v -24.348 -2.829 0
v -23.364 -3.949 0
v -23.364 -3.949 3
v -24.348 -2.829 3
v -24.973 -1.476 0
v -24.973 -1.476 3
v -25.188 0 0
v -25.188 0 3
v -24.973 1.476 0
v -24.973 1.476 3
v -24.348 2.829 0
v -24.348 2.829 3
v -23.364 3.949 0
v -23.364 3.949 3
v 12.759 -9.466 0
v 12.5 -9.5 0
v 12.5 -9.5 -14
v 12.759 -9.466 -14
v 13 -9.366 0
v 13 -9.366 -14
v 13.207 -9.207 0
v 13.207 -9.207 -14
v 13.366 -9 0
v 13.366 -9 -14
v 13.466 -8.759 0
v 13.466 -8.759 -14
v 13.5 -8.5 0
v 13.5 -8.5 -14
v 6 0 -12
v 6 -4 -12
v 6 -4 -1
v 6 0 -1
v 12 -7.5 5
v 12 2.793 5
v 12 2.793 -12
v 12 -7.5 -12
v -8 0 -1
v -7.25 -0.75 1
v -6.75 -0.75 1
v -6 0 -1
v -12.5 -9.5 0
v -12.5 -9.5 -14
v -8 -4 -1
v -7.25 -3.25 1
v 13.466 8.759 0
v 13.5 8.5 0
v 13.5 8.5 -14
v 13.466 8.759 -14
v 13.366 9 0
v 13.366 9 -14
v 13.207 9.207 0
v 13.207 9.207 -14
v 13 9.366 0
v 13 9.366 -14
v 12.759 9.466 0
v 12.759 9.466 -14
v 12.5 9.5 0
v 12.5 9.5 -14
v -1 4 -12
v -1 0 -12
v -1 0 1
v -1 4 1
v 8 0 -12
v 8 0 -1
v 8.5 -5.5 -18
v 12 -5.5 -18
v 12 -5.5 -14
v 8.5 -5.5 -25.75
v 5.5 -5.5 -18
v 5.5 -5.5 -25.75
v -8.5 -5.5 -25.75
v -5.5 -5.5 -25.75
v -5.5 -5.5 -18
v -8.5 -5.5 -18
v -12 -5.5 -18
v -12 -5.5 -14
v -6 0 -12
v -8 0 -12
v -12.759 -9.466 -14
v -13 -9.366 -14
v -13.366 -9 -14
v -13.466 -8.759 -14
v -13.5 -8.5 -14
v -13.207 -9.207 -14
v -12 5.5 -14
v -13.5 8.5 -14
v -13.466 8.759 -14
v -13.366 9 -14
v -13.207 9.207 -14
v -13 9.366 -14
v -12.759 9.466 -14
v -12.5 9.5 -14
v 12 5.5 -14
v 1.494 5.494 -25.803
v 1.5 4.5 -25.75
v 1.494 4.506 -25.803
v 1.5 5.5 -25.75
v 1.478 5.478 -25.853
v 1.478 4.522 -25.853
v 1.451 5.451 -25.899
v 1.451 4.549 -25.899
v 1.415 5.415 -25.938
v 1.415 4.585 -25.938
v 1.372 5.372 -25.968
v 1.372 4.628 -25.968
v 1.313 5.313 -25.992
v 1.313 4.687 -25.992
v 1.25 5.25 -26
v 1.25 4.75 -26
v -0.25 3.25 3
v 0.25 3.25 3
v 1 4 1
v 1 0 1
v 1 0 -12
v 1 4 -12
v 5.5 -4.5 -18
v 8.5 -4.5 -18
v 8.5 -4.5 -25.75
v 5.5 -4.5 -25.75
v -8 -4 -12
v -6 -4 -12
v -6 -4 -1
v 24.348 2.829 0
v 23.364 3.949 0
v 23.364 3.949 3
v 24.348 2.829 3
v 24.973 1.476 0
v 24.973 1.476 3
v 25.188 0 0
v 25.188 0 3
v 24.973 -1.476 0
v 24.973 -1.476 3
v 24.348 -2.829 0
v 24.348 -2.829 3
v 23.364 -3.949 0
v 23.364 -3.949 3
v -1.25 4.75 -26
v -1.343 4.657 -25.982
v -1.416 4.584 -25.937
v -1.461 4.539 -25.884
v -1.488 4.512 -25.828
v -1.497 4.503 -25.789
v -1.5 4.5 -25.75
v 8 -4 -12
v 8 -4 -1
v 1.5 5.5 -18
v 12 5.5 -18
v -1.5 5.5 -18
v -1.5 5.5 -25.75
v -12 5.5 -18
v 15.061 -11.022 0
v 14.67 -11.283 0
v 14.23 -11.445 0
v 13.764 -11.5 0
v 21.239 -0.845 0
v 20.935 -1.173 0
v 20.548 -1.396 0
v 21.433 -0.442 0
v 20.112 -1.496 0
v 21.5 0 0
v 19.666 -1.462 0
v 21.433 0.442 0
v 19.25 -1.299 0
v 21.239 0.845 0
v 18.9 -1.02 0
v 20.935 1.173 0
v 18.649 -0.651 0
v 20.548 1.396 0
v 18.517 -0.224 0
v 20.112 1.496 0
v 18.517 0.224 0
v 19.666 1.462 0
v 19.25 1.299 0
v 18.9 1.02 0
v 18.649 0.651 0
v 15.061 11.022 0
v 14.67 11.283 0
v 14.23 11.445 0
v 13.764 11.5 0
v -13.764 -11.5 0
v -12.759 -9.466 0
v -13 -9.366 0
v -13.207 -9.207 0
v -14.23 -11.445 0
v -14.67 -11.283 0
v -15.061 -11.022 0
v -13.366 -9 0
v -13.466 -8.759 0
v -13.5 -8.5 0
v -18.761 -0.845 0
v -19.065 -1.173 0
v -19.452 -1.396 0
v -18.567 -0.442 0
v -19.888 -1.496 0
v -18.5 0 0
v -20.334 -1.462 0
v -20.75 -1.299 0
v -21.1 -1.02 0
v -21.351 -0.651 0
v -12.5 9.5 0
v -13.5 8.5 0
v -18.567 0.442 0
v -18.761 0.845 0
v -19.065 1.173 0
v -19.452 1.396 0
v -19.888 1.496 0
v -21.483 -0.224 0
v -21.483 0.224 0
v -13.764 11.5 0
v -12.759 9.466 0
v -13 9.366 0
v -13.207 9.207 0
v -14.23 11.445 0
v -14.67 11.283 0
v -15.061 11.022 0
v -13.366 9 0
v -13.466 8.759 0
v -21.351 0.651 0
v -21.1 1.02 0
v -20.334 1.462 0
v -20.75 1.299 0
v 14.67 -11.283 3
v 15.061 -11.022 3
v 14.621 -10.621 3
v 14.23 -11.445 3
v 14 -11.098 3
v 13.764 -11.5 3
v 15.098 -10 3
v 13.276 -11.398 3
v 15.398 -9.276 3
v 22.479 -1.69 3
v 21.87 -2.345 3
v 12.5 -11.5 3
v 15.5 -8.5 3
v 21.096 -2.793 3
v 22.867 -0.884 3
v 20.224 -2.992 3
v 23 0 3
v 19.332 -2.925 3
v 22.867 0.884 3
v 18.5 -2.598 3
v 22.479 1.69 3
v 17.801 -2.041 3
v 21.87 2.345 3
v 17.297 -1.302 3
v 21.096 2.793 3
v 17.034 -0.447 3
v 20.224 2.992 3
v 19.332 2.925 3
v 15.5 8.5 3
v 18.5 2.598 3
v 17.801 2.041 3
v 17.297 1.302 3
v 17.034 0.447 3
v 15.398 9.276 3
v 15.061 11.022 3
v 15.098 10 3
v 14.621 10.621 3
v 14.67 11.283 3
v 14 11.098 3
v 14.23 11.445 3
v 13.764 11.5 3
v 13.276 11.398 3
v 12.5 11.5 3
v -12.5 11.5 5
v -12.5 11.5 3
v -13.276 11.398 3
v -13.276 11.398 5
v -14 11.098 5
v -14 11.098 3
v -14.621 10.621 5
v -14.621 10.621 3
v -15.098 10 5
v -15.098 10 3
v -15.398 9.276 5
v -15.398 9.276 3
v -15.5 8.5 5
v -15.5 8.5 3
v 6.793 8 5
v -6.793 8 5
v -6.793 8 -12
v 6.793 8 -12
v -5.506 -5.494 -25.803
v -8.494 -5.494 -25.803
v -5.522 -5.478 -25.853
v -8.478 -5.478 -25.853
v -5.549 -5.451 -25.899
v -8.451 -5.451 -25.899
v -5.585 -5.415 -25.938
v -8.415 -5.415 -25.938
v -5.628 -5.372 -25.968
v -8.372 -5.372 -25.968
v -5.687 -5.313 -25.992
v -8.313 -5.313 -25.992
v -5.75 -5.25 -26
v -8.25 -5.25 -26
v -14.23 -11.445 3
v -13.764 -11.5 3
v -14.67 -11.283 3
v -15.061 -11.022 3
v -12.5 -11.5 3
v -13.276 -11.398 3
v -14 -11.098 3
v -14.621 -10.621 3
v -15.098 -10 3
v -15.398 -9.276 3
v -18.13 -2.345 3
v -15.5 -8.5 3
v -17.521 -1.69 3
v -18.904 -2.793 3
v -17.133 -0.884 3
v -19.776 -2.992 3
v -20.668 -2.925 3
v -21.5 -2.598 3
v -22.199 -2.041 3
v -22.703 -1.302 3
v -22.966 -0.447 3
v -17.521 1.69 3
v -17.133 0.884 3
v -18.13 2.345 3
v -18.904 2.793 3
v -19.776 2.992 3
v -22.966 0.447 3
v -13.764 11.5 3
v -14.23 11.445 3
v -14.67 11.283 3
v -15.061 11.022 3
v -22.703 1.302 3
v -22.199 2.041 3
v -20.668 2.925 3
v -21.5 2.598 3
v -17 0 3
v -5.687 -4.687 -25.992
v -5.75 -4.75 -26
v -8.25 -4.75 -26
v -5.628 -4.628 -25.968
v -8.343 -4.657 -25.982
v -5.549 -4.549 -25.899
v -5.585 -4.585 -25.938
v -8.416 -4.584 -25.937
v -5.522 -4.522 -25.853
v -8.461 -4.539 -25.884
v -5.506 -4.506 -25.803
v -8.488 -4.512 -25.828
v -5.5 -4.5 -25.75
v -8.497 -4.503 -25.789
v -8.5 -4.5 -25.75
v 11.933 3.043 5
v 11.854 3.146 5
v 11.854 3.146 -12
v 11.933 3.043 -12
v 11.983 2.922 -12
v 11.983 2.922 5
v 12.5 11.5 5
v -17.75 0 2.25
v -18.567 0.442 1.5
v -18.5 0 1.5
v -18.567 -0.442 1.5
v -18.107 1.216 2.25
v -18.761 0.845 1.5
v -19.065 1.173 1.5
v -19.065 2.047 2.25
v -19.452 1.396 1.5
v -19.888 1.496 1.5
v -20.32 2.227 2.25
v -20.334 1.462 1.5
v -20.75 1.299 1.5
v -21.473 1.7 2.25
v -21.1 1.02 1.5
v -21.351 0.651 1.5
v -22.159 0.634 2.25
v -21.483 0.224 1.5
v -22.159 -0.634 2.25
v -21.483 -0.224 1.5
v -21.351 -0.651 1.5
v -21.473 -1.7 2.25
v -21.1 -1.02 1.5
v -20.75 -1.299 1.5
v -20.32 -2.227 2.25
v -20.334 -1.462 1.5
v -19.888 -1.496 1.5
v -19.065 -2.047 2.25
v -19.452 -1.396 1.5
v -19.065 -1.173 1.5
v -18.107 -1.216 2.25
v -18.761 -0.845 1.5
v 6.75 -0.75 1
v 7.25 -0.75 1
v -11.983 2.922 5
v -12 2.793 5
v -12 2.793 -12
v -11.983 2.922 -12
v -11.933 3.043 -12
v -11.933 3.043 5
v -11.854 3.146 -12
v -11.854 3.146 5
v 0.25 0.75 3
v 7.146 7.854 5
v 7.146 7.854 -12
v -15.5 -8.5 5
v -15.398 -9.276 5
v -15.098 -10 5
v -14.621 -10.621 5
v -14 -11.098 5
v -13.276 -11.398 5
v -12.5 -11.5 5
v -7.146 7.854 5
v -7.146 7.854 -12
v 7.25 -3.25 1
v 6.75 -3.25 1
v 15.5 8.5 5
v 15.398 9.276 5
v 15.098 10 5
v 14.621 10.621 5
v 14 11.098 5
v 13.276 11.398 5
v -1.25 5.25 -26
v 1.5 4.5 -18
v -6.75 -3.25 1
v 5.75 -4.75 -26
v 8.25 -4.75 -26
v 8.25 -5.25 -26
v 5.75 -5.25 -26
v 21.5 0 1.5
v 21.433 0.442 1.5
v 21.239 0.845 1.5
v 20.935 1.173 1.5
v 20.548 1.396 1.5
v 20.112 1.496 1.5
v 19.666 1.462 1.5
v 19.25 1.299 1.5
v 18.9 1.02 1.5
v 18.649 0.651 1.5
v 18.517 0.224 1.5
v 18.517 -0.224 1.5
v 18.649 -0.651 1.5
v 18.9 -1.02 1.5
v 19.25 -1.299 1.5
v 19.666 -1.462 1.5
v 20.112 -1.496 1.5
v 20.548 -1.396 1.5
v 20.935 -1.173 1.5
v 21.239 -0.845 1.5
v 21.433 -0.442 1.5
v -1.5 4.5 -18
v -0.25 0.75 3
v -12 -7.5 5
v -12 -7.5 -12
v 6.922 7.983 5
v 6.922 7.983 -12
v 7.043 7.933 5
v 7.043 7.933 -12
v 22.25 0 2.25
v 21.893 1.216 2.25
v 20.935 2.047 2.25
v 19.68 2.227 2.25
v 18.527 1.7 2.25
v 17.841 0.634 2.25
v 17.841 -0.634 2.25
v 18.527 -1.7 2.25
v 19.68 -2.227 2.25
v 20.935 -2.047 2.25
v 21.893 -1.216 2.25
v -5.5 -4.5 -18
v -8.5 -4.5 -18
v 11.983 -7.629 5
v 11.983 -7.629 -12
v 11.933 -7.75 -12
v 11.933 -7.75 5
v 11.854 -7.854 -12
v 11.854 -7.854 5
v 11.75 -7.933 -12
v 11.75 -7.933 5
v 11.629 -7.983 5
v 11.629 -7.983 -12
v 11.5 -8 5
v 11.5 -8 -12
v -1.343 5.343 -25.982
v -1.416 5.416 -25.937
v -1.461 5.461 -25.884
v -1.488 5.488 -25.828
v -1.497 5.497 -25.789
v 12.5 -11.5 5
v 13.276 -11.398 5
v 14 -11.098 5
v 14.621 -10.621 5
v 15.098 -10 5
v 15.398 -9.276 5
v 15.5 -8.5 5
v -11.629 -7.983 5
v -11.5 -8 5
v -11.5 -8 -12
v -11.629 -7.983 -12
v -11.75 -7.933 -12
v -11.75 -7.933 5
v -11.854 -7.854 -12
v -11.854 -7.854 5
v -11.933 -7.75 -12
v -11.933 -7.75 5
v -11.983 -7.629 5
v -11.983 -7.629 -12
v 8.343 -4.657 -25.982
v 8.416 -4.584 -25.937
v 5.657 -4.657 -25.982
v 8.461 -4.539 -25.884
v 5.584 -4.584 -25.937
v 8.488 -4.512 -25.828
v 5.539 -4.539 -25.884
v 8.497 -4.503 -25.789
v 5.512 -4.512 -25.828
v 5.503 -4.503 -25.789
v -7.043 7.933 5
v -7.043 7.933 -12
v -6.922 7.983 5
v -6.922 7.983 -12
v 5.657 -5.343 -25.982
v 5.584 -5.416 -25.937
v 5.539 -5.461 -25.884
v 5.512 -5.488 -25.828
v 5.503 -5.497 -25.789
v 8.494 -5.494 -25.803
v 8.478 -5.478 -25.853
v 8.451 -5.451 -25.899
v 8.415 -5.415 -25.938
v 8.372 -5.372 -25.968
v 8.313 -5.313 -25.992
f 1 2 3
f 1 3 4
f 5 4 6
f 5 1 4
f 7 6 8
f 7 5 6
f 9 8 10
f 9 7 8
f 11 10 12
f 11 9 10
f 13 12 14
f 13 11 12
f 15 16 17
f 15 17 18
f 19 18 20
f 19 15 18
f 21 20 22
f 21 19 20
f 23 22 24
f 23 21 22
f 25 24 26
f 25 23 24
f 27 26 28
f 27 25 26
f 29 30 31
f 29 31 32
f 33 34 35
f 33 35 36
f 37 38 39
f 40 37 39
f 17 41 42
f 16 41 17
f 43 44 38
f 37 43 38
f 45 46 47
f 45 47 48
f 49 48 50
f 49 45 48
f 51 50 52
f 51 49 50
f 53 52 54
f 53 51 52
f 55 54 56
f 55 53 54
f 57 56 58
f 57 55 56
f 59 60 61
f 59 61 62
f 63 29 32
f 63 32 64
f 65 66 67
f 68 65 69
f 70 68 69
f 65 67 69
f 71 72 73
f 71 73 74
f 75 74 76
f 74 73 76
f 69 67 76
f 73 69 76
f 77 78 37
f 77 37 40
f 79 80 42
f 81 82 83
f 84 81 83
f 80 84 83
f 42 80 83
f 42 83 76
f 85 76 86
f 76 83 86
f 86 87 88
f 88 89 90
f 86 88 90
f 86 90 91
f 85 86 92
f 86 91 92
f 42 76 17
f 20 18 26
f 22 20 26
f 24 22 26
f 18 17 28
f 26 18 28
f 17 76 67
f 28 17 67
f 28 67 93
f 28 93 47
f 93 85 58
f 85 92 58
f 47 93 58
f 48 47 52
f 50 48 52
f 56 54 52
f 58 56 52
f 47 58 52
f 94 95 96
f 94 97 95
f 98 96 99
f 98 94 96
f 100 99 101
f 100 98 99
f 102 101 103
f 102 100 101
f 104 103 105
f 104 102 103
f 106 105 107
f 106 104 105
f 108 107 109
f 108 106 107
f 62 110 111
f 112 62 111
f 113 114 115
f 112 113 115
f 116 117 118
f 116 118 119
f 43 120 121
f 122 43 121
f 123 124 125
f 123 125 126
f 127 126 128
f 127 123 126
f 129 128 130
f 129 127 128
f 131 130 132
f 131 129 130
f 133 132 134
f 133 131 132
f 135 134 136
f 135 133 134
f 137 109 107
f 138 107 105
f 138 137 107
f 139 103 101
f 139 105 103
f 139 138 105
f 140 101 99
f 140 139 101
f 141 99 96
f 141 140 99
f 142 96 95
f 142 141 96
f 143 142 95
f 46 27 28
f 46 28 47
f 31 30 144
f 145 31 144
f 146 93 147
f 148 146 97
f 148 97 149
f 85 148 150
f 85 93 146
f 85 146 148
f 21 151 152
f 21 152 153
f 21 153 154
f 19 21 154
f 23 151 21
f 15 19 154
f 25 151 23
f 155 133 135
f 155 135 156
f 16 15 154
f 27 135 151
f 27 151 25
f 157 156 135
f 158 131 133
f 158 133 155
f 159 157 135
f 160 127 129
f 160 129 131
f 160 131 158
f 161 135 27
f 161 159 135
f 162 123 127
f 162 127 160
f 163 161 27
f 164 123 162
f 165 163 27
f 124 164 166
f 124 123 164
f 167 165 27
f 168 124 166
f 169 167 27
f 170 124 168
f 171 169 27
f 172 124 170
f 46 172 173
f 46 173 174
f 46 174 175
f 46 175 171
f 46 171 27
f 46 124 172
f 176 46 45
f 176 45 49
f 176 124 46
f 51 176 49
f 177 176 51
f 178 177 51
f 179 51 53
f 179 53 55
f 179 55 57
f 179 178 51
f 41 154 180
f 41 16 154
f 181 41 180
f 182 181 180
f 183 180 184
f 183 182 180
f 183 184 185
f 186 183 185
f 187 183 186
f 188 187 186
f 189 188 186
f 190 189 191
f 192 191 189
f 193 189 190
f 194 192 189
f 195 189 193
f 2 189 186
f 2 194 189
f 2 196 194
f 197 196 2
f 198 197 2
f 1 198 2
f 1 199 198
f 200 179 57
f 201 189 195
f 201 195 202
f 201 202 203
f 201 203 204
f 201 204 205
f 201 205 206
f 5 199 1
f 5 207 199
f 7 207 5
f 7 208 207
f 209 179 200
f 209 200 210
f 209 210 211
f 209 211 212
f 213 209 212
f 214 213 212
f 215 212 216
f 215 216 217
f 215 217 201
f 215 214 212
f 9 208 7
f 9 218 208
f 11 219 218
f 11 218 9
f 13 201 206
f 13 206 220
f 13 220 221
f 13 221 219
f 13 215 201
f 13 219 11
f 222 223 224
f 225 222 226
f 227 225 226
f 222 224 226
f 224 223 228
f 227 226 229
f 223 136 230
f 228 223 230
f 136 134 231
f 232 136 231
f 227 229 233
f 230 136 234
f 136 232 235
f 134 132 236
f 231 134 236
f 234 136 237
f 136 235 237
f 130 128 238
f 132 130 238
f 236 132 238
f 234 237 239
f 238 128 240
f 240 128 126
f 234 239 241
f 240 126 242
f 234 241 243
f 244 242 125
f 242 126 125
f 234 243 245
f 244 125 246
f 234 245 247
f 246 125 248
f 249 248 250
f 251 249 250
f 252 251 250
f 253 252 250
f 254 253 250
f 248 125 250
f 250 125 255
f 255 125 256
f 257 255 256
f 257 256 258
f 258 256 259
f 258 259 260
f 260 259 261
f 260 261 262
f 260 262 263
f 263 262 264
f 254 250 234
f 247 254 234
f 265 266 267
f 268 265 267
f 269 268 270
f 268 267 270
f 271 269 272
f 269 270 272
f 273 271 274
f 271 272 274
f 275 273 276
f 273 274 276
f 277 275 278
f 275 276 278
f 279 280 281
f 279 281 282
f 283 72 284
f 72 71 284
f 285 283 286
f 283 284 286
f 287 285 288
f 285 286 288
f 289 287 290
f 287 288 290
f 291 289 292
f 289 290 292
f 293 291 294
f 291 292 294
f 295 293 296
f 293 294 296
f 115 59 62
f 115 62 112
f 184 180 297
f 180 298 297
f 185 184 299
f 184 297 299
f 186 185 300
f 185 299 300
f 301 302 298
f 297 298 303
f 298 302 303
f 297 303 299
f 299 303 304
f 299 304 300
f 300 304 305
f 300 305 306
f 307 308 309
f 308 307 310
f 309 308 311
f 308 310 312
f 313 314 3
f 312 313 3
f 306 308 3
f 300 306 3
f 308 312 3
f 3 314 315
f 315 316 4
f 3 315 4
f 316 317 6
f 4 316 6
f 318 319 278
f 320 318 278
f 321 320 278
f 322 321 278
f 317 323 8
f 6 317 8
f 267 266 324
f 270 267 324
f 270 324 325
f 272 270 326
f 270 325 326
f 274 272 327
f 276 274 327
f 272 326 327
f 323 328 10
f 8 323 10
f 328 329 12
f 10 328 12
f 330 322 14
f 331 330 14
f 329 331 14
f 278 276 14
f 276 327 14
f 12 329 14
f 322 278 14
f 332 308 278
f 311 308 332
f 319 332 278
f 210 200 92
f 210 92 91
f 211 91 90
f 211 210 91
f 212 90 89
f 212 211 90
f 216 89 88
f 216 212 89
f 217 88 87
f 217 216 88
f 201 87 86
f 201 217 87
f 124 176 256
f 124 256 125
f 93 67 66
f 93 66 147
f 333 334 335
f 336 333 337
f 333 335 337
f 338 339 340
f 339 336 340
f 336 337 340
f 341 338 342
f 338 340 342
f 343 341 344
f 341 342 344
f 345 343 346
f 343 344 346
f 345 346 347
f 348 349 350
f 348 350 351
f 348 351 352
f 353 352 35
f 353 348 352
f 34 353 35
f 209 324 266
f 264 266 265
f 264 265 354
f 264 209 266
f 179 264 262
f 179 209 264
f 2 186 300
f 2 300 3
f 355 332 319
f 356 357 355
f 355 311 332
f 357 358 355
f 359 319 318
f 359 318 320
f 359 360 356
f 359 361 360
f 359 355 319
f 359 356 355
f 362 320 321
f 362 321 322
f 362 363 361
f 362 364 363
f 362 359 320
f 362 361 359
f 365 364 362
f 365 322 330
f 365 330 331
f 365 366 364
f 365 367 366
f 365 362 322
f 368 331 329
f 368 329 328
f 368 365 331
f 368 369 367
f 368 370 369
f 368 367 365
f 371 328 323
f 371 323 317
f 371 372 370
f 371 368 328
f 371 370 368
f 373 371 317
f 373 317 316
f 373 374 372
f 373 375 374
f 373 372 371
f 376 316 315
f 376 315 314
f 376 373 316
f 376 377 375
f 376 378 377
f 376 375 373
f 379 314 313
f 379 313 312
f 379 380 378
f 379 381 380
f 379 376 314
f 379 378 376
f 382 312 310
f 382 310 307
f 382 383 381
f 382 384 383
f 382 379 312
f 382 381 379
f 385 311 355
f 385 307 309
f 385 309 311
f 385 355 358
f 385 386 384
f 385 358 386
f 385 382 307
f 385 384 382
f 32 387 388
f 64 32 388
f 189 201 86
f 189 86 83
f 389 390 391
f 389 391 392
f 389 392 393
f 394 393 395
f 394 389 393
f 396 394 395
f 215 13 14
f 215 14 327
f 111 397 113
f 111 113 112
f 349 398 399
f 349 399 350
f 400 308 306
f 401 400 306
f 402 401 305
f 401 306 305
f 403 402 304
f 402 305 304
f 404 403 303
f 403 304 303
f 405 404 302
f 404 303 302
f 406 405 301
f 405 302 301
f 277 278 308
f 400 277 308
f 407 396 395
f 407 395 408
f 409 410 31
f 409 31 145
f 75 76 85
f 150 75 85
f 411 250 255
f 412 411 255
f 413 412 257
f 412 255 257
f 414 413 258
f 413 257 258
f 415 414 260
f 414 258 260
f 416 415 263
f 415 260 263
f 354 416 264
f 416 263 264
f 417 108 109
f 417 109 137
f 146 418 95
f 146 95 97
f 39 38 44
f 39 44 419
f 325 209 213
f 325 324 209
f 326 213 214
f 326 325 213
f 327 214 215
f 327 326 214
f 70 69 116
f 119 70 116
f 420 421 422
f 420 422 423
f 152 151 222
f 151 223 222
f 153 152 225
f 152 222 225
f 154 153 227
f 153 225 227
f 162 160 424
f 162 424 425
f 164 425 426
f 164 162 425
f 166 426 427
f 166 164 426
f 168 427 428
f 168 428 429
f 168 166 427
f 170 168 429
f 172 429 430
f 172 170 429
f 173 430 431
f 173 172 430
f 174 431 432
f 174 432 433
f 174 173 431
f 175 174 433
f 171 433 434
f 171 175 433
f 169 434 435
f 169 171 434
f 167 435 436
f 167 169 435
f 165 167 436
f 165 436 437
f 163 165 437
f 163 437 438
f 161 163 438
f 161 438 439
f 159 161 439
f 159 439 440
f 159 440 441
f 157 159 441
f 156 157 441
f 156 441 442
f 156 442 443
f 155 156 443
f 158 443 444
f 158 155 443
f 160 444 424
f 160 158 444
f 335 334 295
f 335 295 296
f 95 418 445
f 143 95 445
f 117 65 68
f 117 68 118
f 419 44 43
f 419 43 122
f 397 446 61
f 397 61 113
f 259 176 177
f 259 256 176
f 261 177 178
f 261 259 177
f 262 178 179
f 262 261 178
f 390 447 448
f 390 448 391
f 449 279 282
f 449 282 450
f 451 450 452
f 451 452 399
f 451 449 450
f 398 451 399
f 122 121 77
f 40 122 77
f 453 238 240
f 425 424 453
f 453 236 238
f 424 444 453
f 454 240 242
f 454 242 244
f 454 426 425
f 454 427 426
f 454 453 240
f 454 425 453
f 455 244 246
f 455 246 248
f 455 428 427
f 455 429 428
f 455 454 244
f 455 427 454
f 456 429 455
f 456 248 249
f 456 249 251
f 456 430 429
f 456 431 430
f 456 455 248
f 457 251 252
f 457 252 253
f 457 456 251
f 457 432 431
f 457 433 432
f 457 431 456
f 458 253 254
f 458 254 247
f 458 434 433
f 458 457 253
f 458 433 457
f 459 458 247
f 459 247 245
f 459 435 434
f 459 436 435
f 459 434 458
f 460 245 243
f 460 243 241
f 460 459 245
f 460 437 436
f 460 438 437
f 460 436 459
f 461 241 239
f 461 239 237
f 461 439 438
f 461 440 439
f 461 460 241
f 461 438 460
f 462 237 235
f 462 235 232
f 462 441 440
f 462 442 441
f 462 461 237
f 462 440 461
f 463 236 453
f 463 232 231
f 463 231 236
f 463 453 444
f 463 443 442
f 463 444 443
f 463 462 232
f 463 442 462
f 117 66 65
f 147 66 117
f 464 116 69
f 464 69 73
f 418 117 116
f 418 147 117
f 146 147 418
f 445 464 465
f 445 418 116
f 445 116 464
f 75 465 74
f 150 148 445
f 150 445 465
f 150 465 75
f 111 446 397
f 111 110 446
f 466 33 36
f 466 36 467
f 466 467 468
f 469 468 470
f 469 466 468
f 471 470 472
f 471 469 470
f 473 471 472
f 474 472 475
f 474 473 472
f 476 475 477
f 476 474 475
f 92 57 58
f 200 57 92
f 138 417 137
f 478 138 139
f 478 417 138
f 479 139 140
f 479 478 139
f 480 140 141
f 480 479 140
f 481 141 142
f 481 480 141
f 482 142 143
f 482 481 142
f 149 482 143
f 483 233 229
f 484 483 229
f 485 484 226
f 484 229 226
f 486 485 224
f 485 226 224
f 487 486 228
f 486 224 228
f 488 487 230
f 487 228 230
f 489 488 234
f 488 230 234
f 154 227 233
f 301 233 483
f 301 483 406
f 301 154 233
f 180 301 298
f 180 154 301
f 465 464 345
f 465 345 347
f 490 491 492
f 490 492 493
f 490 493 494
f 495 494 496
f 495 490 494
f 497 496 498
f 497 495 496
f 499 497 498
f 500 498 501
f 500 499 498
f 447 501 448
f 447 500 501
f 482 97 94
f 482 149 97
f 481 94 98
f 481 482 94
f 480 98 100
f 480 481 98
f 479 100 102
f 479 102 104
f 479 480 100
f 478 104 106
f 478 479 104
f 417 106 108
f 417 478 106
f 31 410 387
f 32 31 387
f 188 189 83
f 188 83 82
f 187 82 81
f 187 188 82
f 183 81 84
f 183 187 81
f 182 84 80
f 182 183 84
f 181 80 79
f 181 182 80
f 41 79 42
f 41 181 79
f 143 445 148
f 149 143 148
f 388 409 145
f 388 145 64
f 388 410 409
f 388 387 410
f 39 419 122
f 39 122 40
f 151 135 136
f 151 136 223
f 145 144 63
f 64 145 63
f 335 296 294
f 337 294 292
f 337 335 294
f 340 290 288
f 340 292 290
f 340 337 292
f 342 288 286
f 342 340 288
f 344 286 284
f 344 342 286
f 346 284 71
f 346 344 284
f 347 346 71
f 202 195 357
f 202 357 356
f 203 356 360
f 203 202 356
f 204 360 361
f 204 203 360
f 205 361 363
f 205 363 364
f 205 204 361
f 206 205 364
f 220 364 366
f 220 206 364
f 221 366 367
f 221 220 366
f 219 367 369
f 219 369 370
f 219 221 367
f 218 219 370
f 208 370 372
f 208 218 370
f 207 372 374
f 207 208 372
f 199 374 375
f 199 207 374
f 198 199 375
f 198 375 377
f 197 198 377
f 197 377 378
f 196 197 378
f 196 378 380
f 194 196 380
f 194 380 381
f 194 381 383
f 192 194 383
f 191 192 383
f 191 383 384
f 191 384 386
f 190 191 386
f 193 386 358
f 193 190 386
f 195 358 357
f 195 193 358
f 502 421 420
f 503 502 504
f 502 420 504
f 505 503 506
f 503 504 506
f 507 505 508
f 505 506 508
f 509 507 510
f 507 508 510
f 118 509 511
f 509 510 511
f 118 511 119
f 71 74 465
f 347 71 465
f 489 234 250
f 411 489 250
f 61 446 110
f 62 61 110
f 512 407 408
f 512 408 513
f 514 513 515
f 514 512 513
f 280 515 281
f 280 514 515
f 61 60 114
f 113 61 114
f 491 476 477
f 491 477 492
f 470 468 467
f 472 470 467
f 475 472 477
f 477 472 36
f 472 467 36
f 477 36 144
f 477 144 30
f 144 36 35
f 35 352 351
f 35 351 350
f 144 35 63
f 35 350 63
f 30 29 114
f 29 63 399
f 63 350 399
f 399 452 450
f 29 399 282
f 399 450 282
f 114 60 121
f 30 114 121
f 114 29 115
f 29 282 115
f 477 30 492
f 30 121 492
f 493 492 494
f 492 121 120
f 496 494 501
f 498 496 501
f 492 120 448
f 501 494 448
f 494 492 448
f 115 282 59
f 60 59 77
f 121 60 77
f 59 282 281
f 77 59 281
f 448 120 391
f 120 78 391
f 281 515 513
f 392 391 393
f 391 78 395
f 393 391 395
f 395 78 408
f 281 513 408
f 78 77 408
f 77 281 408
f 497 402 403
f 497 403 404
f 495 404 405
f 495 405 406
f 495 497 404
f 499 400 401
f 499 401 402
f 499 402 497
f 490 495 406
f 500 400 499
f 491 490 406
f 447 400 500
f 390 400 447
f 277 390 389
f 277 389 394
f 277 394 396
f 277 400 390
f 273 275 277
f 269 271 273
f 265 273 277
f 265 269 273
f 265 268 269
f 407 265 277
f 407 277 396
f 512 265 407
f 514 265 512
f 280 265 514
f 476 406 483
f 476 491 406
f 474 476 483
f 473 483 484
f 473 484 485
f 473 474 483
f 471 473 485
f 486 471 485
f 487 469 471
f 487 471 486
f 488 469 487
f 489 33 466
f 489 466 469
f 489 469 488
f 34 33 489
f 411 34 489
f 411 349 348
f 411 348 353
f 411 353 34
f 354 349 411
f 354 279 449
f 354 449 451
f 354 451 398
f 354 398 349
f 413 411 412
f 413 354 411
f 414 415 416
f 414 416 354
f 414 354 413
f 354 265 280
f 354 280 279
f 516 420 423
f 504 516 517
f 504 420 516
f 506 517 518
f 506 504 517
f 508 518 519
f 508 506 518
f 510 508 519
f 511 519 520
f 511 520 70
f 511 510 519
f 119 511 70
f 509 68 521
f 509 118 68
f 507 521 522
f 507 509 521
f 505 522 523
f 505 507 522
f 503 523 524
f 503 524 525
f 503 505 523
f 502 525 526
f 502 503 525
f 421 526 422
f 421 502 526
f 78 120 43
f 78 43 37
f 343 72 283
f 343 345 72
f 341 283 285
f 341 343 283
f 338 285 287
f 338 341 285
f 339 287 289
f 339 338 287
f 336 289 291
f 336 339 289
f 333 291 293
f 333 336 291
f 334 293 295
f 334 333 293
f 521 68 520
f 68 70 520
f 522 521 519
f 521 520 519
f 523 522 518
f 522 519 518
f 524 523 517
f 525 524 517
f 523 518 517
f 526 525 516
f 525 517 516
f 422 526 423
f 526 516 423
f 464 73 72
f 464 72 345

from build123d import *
from OCP.BRepFilletAPI import BRepFilletAPI_MakeChamfer

# Parameters (mm, degrees)
SKIZZE1_R                       = 1.5
AUFSATZ_LINEAR_AUSTRAGEN1_DEPTH = 3
VERRUNDUNG1_R                   = 2
FASE1_SIZE                      = 1.5
AUFSATZ_LINEAR_AUSTRAGEN2_DEPTH = 2
AUFSATZ_LINEAR_AUSTRAGEN3_DEPTH = 14
SCHNITT_LINEAR_AUSTRAGEN1_DEPTH = 17
SKIZZE5_W                       = 24
SKIZZE5_H                       = 11
AUFSATZ_LINEAR_AUSTRAGEN4_DEPTH = 4
SKIZZE6_W                       = 3
SKIZZE6_H                       = 1
AUFSATZ_LINEAR_AUSTRAGEN5_DEPTH = 8
SKIZZE7_W                       = 2
SKIZZE7_H                       = 4
AUFSATZ_LINEAR_AUSTRAGEN6_DEPTH = 13
SKIZZE8_W                       = 2
SKIZZE8_H                       = 4
AUFSATZ_LINEAR_AUSTRAGEN7_DEPTH = 15
FASE2_SIZE                      = 2
FASE2_SIZE2                     = 0.75
VERRUNDUNG2_R                   = 0.25


with BuildPart() as part:
    # Skizze1 → Aufsatz-Linear austragen1 (new body)
    with BuildSketch(Plane.XY):
        with BuildLine():
            ThreePointArc((23.364069952, 3.949125596), (25.187731645, 0), (23.364069952, -3.949125596))
            Line((23.364069952, -3.949125596), (14.5, -11.5))
            Line((14.5, -11.5), (-14.5, -11.5))
            Line((-14.5, -11.5), (-23.364069952, -3.949125596))
            ThreePointArc((-23.364069952, -3.949125596), (-25.187731645, 0), (-23.364069952, 3.949125596))
            Line((-23.364069952, 3.949125596), (-14.5, 11.5))
            Line((-14.5, 11.5), (14.5, 11.5))
            Line((14.5, 11.5), (23.364069952, 3.949125596))
        make_face()
        with Locations((20, 0)):
            Circle(SKIZZE1_R, mode=Mode.SUBTRACT)
        with Locations((-20, 0)):
            Circle(SKIZZE1_R, mode=Mode.SUBTRACT)
    extrude(amount=AUFSATZ_LINEAR_AUSTRAGEN1_DEPTH)

    # Verrundung1
    verrundung1_edges = [part.edges().sort_by_distance(p)[0] for p in [
        (14.5, -11.5, 1.5),
        (-14.5, -11.5, 1.5),
        (-14.5, 11.5, 1.5),
        (14.5, 11.5, 1.5),
    ]]
    fillet(verrundung1_edges, radius=VERRUNDUNG1_R)

    # Fase1
    fase1_edges = [part.edges().sort_by_distance(p)[0] for p in [
        (18.5, 0, 3),
        (-21.5, 0, 3),
    ]]
    chamfer(fase1_edges, length=FASE1_SIZE)

    # Skizze2 → Aufsatz-Linear austragen2 (add)
    with BuildSketch(Plane.XY.offset(3)):
        with BuildLine():
            Line((-12.5, -11.5), (12.5, -11.5))
            ThreePointArc((12.5, -11.5), (14.621320344, -10.621320344), (15.5, -8.5))
            Line((15.5, -8.5), (15.5, 8.5))
            ThreePointArc((15.5, 8.5), (14.621320344, 10.621320344), (12.5, 11.5))
            Line((12.5, 11.5), (-12.5, 11.5))
            ThreePointArc((-12.5, 11.5), (-14.621320344, 10.621320344), (-15.5, 8.5))
            Line((-15.5, 8.5), (-15.5, -8.5))
            ThreePointArc((-15.5, -8.5), (-14.621320344, -10.621320344), (-12.5, -11.5))
        make_face()
    extrude(amount=AUFSATZ_LINEAR_AUSTRAGEN2_DEPTH)

    # Skizze4 → Aufsatz-Linear austragen3 (add)
    with BuildSketch(Plane(origin=(0, 0, 0), x_dir=(-1, 0, 0), z_dir=(0, 0, -1))):
        with BuildLine():
            Line((12.5, -9.5), (-12.5, -9.5))
            ThreePointArc((-12.5, -9.5), (-13.207106781, -9.207106781), (-13.5, -8.5))
            Line((-13.5, -8.5), (-13.5, 8.5))
            ThreePointArc((-13.5, 8.5), (-13.207106781, 9.207106781), (-12.5, 9.5))
            Line((-12.5, 9.5), (12.5, 9.5))
            ThreePointArc((12.5, 9.5), (13.207106781, 9.207106781), (13.5, 8.5))
            Line((13.5, 8.5), (13.5, -8.5))
            ThreePointArc((13.5, -8.5), (13.207106781, -9.207106781), (12.5, -9.5))
        make_face()
    extrude(amount=AUFSATZ_LINEAR_AUSTRAGEN3_DEPTH)

    # Skizze3 → Schnitt-Linear austragen1 (cut)
    with BuildSketch(Plane.XY.offset(5)):
        with BuildLine():
            Line((11.5, -8), (-11.5, -8))
            ThreePointArc((-11.5, -8), (-11.853553391, -7.853553391), (-12, -7.5))
            Line((-12, -7.5), (-12, 2.792893219))
            ThreePointArc((-12, 2.792893219), (-11.961939766, 2.984234935), (-11.853553391, 3.146446609))
            Line((-11.853553391, 3.146446609), (-7.146446609, 7.853553391))
            ThreePointArc((-7.146446609, 7.853553391), (-6.984234935, 7.961939766), (-6.792893219, 8))
            Line((-6.792893219, 8), (6.792893219, 8))
            ThreePointArc((6.792893219, 8), (6.984234935, 7.961939766), (7.146446609, 7.853553391))
            Line((7.146446609, 7.853553391), (11.853553391, 3.146446609))
            ThreePointArc((11.853553391, 3.146446609), (11.961939766, 2.984234935), (12, 2.792893219))
            Line((12, 2.792893219), (12, -7.5))
            ThreePointArc((12, -7.5), (11.853553391, -7.853553391), (11.5, -8))
        make_face()
    extrude(amount=-SCHNITT_LINEAR_AUSTRAGEN1_DEPTH, mode=Mode.SUBTRACT)

    # Skizze5 → Aufsatz-Linear austragen4 (add)
    with BuildSketch(Plane(origin=(0, 0, -14), x_dir=(-1, 0, 0), z_dir=(0, 0, -1))):
        Rectangle(SKIZZE5_W, SKIZZE5_H)
    extrude(amount=AUFSATZ_LINEAR_AUSTRAGEN4_DEPTH)

    # Skizze6 → Aufsatz-Linear austragen5 (add)
    with BuildSketch(Plane(origin=(0, 0, -18), x_dir=(-1, 0, 0), z_dir=(0, 0, -1))):
        with Locations((0, 5)):
            Rectangle(SKIZZE6_W, SKIZZE6_H)
        with Locations((-7, -5)):
            Rectangle(SKIZZE6_W, SKIZZE6_H)
        with Locations((7, -5)):
            Rectangle(SKIZZE6_W, SKIZZE6_H)
    extrude(amount=AUFSATZ_LINEAR_AUSTRAGEN5_DEPTH)

    # Skizze7 → Aufsatz-Linear austragen6 (add)
    with BuildSketch(Plane.XY.offset(-12)):
        with Locations((-7, -2)):
            Rectangle(SKIZZE7_W, SKIZZE7_H)
        with Locations((7, -2)):
            Rectangle(SKIZZE7_W, SKIZZE7_H)
    extrude(amount=AUFSATZ_LINEAR_AUSTRAGEN6_DEPTH)

    # Skizze8 → Aufsatz-Linear austragen7 (add)
    with BuildSketch(Plane.XY.offset(-12)):
        with Locations((0, 2)):
            Rectangle(SKIZZE8_W, SKIZZE8_H)
    extrude(amount=AUFSATZ_LINEAR_AUSTRAGEN7_DEPTH)

    # Fase2: one chamfer whose edges measure the first distance from different faces: ONE call of the kernel's chamfer builder (chamfer() names one face for all edges)
    fase2_edges_1 = [part.edges().sort_by_distance(p)[0] for p in [
        (7, -4, 1),
    ]]
    fase2_side_1 = [part.faces().sort_by_distance(p)[0] for p in [
        (7, -4, -5.5),
    ]]
    fase2_edges_2 = [part.edges().sort_by_distance(p)[0] for p in [
        (6, -2, 1),
    ]]
    fase2_side_2 = [part.faces().sort_by_distance(p)[0] for p in [
        (6, -2, -5.5),
    ]]
    fase2_edges_3 = [part.edges().sort_by_distance(p)[0] for p in [
        (7, 0, 1),
    ]]
    fase2_side_3 = [part.faces().sort_by_distance(p)[0] for p in [
        (7, 0, -5.5),
    ]]
    fase2_edges_4 = [part.edges().sort_by_distance(p)[0] for p in [
        (8, -2, 1),
    ]]
    fase2_side_4 = [part.faces().sort_by_distance(p)[0] for p in [
        (8, -2, -5.5),
    ]]
    fase2_edges_5 = [part.edges().sort_by_distance(p)[0] for p in [
        (0, 0, 3),
    ]]
    fase2_side_5 = [part.faces().sort_by_distance(p)[0] for p in [
        (0, 0, -4.5),
    ]]
    fase2_edges_6 = [part.edges().sort_by_distance(p)[0] for p in [
        (-1, 2, 3),
    ]]
    fase2_side_6 = [part.faces().sort_by_distance(p)[0] for p in [
        (-1, 2, -4.5),
    ]]
    fase2_edges_7 = [part.edges().sort_by_distance(p)[0] for p in [
        (0, 4, 3),
    ]]
    fase2_side_7 = [part.faces().sort_by_distance(p)[0] for p in [
        (0, 4, -4.5),
    ]]
    fase2_edges_8 = [part.edges().sort_by_distance(p)[0] for p in [
        (1, 2, 3),
    ]]
    fase2_side_8 = [part.faces().sort_by_distance(p)[0] for p in [
        (1, 2, -4.5),
    ]]
    fase2_edges_9 = [part.edges().sort_by_distance(p)[0] for p in [
        (-7, 0, 1),
    ]]
    fase2_side_9 = [part.faces().sort_by_distance(p)[0] for p in [
        (-7, 0, -5.5),
    ]]
    fase2_edges_10 = [part.edges().sort_by_distance(p)[0] for p in [
        (-6, -2, 1),
    ]]
    fase2_side_10 = [part.faces().sort_by_distance(p)[0] for p in [
        (-6, -2, -5.5),
    ]]
    fase2_edges_11 = [part.edges().sort_by_distance(p)[0] for p in [
        (-7, -4, 1),
    ]]
    fase2_side_11 = [part.faces().sort_by_distance(p)[0] for p in [
        (-7, -4, -5.5),
    ]]
    fase2_edges_12 = [part.edges().sort_by_distance(p)[0] for p in [
        (-8, -2, 1),
    ]]
    fase2_side_12 = [part.faces().sort_by_distance(p)[0] for p in [
        (-8, -2, -5.5),
    ]]
    fase2 = BRepFilletAPI_MakeChamfer(part.part.solid().wrapped)
    for e in fase2_edges_1:
        fase2.Add(FASE2_SIZE, FASE2_SIZE2, e.wrapped, fase2_side_1[0].wrapped)  # the first distance lies on this face
    for e in fase2_edges_2:
        fase2.Add(FASE2_SIZE, FASE2_SIZE2, e.wrapped, fase2_side_2[0].wrapped)  # the first distance lies on this face
    for e in fase2_edges_3:
        fase2.Add(FASE2_SIZE, FASE2_SIZE2, e.wrapped, fase2_side_3[0].wrapped)  # the first distance lies on this face
    for e in fase2_edges_4:
        fase2.Add(FASE2_SIZE, FASE2_SIZE2, e.wrapped, fase2_side_4[0].wrapped)  # the first distance lies on this face
    for e in fase2_edges_5:
        fase2.Add(FASE2_SIZE, FASE2_SIZE2, e.wrapped, fase2_side_5[0].wrapped)  # the first distance lies on this face
    for e in fase2_edges_6:
        fase2.Add(FASE2_SIZE, FASE2_SIZE2, e.wrapped, fase2_side_6[0].wrapped)  # the first distance lies on this face
    for e in fase2_edges_7:
        fase2.Add(FASE2_SIZE, FASE2_SIZE2, e.wrapped, fase2_side_7[0].wrapped)  # the first distance lies on this face
    for e in fase2_edges_8:
        fase2.Add(FASE2_SIZE, FASE2_SIZE2, e.wrapped, fase2_side_8[0].wrapped)  # the first distance lies on this face
    for e in fase2_edges_9:
        fase2.Add(FASE2_SIZE, FASE2_SIZE2, e.wrapped, fase2_side_9[0].wrapped)  # the first distance lies on this face
    for e in fase2_edges_10:
        fase2.Add(FASE2_SIZE, FASE2_SIZE2, e.wrapped, fase2_side_10[0].wrapped)  # the first distance lies on this face
    for e in fase2_edges_11:
        fase2.Add(FASE2_SIZE, FASE2_SIZE2, e.wrapped, fase2_side_11[0].wrapped)  # the first distance lies on this face
    for e in fase2_edges_12:
        fase2.Add(FASE2_SIZE, FASE2_SIZE2, e.wrapped, fase2_side_12[0].wrapped)  # the first distance lies on this face
    add(Compound.cast(fase2.Shape()), mode=Mode.REPLACE)

    # Verrundung2
    verrundung2_edges = [part.edges().sort_by_distance(p)[0] for p in [
        (1.5, 5, -26),
        (0, 4.5, -26),
        (-1.5, 5, -26),
        (0, 5.5, -26),
        (5.5, -5, -26),
        (7, -4.5, -26),
        (8.5, -5, -26),
        (7, -5.5, -26),
        (-5.5, -5, -26),
        (-7, -5.5, -26),
        (-8.5, -5, -26),
        (-7, -4.5, -26),
    ]]
    fillet(verrundung2_edges, radius=VERRUNDUNG2_R)


solid = part.part
